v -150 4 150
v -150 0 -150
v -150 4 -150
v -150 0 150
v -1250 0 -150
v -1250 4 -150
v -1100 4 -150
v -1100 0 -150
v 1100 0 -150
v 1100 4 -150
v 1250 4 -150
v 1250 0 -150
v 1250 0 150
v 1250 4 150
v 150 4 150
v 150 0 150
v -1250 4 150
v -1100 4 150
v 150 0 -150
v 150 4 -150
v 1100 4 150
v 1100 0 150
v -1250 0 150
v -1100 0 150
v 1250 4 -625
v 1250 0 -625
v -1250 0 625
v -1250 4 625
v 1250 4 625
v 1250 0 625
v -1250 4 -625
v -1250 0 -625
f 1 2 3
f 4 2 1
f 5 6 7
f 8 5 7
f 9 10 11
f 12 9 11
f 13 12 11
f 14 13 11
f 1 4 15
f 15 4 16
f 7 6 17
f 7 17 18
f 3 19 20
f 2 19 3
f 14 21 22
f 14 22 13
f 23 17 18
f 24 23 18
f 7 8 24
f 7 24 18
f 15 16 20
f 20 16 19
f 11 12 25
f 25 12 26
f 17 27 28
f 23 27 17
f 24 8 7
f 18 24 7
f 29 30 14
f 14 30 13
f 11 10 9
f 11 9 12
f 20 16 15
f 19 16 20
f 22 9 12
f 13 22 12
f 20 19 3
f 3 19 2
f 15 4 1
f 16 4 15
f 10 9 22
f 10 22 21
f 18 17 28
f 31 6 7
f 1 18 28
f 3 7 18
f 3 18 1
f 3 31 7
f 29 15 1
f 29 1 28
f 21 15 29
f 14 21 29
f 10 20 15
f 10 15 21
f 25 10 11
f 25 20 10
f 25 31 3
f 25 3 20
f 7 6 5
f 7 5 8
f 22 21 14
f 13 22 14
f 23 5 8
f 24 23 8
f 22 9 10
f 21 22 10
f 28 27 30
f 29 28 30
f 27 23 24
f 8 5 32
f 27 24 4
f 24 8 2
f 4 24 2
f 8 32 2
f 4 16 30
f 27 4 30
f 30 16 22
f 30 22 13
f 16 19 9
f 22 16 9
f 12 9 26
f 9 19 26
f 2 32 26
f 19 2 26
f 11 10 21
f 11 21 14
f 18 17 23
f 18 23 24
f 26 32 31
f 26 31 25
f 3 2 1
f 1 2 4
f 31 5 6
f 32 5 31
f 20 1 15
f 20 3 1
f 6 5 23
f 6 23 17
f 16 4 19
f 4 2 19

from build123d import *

# Parameters (mm, degrees)
SKETCH1_W              = 2500
SKETCH1_H              = 1250
BOSS_EXTRUDE1_DEPTH    = 4
SPLIT1_SURFACE_1_BACK  = 2796.088
SPLIT1_SURFACE_1_DEPTH = 5592.176
SPLIT1_SURFACE_2_BACK  = 2796.088
SPLIT1_SURFACE_2_DEPTH = 5592.176
SPLIT2_START           = -150
SPLIT2_OUTLINE_W       = 150
SPLIT2_OUTLINE_H       = 4
SPLIT2_DEPTH           = 300
SPLIT2_2_OUTLINE_W     = 150
SPLIT2_2_OUTLINE_H     = 4
SPLIT2_2_DEPTH         = 300
SPLIT2_3_OUTLINE_W     = 150
SPLIT2_3_OUTLINE_H     = 4
SPLIT2_3_DEPTH         = 300


# Read off the part's stored shape, not the designer's step: Split2
with BuildPart() as part:
    # Sketch1 → Boss-Extrude1 (new body)
    with BuildSketch(Plane(origin=(0, 0, 0), x_dir=(1, 0, 0), z_dir=(0, 1, 0))):
        Rectangle(SKETCH1_W, SKETCH1_H)
    extrude(amount=BOSS_EXTRUDE1_DEPTH)


with BuildPart() as body_2:
    # Split1: the piece behind the surface
    add(part.part)
    # Split1 surface: a surface, the sketch's curves swept straight by 5592.176 mm
    with BuildLine(Plane(origin=(0, 4, 0), x_dir=(1, 0, 0), z_dir=(0, 1, 0)).offset(-SPLIT1_SURFACE_1_BACK), mode=Mode.PRIVATE) as split1_surface_1_path:
        Line((-150, -150), (150, -150))
        Line((150, -150), (150, 150))
        Line((150, 150), (-150, 150))
        Line((-150, 150), (-150, -150))
    split1_surface_1 = Shell.extrude(split1_surface_1_path.wire(), (0 * SPLIT1_SURFACE_1_DEPTH, 1 * SPLIT1_SURFACE_1_DEPTH, 0 * SPLIT1_SURFACE_1_DEPTH))
    split(bisect_by=split1_surface_1, keep=Keep.BOTTOM)

    # Split2 2 outline → Split2 2 (cut)
    with BuildSketch(Plane.XY.offset(SPLIT2_START)):
        with Locations((-1175, 2)):
            Rectangle(SPLIT2_2_OUTLINE_W, SPLIT2_2_OUTLINE_H)
        with Locations((1175, 2)):
            Rectangle(SPLIT2_2_OUTLINE_W, SPLIT2_2_OUTLINE_H)
    extrude(amount=SPLIT2_2_DEPTH, mode=Mode.SUBTRACT)


with BuildPart() as part_1:
    add(part.part)

    # Split1: split by a surface, the side it looks to stays
    # Split1 surface: a surface, the sketch's curves swept straight by 5592.176 mm
    with BuildLine(Plane(origin=(0, 4, 0), x_dir=(1, 0, 0), z_dir=(0, 1, 0)).offset(-SPLIT1_SURFACE_2_BACK), mode=Mode.PRIVATE) as split1_surface_2_path:
        Line((-150, -150), (150, -150))
        Line((150, -150), (150, 150))
        Line((150, 150), (-150, 150))
        Line((-150, 150), (-150, -150))
    split1_surface_2 = Shell.extrude(split1_surface_2_path.wire(), (0 * SPLIT1_SURFACE_2_DEPTH, 1 * SPLIT1_SURFACE_2_DEPTH, 0 * SPLIT1_SURFACE_2_DEPTH))
    split(bisect_by=split1_surface_2, keep=Keep.TOP)


with BuildPart() as body_3:
    # Split2 outline → Split2 (new body)
    with BuildSketch(Plane.XY.offset(SPLIT2_START)):
        with Locations((-1175, 2)):
            Rectangle(SPLIT2_OUTLINE_W, SPLIT2_OUTLINE_H)
    extrude(amount=SPLIT2_DEPTH)


with BuildPart() as body_4:
    # Split2 3 outline → Split2 3 (new body)
    with BuildSketch(Plane.XY.offset(SPLIT2_START)):
        with Locations((1175, 2)):
            Rectangle(SPLIT2_3_OUTLINE_W, SPLIT2_3_OUTLINE_H)
    extrude(amount=SPLIT2_3_DEPTH)


solid = Compound([body_2.part, part_1.part, body_3.part, body_4.part])
